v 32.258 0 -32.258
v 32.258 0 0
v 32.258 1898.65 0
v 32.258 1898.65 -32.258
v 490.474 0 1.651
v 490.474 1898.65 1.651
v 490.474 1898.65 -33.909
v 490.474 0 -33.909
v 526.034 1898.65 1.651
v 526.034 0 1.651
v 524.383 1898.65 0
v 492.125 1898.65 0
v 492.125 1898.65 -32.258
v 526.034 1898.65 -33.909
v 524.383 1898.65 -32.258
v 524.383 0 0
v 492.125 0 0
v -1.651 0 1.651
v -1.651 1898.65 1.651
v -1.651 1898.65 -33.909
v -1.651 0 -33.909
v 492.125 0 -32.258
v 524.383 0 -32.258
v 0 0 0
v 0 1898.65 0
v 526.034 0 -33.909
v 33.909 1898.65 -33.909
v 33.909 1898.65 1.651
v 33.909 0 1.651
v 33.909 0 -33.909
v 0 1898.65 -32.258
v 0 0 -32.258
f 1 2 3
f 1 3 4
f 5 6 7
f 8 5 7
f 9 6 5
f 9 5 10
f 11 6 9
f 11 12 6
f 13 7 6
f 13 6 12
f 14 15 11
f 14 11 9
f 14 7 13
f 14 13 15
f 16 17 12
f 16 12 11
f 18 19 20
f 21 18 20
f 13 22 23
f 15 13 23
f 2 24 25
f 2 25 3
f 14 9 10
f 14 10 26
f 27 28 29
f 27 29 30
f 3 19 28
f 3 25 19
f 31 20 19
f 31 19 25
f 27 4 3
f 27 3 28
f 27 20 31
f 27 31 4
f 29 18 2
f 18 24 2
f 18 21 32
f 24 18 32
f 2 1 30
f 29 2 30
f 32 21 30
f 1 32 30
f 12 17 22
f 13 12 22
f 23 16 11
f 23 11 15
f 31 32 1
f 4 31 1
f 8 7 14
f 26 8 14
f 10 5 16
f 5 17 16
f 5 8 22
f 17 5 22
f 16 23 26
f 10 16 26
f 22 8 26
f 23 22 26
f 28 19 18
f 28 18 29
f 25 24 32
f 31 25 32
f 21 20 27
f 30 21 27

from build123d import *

# Parameters (mm, degrees)
SKETCH1_W             = 35.56
SKETCH1_H             = 35.56
SKETCH1_W_2           = 32.258
SKETCH1_H_2           = 32.258
BOSS_EXTRUDE1_DEPTH   = 1898.65
BOSS_EXTRUDE1_2_DEPTH = 1898.65


with BuildPart() as part:
    # Sketch1 → Boss-Extrude1 (new body)
    with BuildSketch(Plane(origin=(0, 0, 0), x_dir=(1, 0, 0), z_dir=(0, 1, 0))):
        with Locations((16.129, 16.129)):
            Rectangle(SKETCH1_W, SKETCH1_H)
        with Locations((16.129, 16.129)):
            Rectangle(SKETCH1_W_2, SKETCH1_H_2, mode=Mode.SUBTRACT)
    extrude(amount=BOSS_EXTRUDE1_DEPTH)


with BuildPart() as body_2:
    # Sketch1 → Boss-Extrude1 2 (new body)
    with BuildSketch(Plane(origin=(0, 0, 0), x_dir=(1, 0, 0), z_dir=(0, 1, 0))):
        with Locations((508.254, 16.129)):
            Rectangle(SKETCH1_W, SKETCH1_H)
        with Locations((508.254, 16.129)):
            Rectangle(SKETCH1_W_2, SKETCH1_H_2, mode=Mode.SUBTRACT)
    extrude(amount=BOSS_EXTRUDE1_2_DEPTH)


solid = Compound([part.part, body_2.part])
